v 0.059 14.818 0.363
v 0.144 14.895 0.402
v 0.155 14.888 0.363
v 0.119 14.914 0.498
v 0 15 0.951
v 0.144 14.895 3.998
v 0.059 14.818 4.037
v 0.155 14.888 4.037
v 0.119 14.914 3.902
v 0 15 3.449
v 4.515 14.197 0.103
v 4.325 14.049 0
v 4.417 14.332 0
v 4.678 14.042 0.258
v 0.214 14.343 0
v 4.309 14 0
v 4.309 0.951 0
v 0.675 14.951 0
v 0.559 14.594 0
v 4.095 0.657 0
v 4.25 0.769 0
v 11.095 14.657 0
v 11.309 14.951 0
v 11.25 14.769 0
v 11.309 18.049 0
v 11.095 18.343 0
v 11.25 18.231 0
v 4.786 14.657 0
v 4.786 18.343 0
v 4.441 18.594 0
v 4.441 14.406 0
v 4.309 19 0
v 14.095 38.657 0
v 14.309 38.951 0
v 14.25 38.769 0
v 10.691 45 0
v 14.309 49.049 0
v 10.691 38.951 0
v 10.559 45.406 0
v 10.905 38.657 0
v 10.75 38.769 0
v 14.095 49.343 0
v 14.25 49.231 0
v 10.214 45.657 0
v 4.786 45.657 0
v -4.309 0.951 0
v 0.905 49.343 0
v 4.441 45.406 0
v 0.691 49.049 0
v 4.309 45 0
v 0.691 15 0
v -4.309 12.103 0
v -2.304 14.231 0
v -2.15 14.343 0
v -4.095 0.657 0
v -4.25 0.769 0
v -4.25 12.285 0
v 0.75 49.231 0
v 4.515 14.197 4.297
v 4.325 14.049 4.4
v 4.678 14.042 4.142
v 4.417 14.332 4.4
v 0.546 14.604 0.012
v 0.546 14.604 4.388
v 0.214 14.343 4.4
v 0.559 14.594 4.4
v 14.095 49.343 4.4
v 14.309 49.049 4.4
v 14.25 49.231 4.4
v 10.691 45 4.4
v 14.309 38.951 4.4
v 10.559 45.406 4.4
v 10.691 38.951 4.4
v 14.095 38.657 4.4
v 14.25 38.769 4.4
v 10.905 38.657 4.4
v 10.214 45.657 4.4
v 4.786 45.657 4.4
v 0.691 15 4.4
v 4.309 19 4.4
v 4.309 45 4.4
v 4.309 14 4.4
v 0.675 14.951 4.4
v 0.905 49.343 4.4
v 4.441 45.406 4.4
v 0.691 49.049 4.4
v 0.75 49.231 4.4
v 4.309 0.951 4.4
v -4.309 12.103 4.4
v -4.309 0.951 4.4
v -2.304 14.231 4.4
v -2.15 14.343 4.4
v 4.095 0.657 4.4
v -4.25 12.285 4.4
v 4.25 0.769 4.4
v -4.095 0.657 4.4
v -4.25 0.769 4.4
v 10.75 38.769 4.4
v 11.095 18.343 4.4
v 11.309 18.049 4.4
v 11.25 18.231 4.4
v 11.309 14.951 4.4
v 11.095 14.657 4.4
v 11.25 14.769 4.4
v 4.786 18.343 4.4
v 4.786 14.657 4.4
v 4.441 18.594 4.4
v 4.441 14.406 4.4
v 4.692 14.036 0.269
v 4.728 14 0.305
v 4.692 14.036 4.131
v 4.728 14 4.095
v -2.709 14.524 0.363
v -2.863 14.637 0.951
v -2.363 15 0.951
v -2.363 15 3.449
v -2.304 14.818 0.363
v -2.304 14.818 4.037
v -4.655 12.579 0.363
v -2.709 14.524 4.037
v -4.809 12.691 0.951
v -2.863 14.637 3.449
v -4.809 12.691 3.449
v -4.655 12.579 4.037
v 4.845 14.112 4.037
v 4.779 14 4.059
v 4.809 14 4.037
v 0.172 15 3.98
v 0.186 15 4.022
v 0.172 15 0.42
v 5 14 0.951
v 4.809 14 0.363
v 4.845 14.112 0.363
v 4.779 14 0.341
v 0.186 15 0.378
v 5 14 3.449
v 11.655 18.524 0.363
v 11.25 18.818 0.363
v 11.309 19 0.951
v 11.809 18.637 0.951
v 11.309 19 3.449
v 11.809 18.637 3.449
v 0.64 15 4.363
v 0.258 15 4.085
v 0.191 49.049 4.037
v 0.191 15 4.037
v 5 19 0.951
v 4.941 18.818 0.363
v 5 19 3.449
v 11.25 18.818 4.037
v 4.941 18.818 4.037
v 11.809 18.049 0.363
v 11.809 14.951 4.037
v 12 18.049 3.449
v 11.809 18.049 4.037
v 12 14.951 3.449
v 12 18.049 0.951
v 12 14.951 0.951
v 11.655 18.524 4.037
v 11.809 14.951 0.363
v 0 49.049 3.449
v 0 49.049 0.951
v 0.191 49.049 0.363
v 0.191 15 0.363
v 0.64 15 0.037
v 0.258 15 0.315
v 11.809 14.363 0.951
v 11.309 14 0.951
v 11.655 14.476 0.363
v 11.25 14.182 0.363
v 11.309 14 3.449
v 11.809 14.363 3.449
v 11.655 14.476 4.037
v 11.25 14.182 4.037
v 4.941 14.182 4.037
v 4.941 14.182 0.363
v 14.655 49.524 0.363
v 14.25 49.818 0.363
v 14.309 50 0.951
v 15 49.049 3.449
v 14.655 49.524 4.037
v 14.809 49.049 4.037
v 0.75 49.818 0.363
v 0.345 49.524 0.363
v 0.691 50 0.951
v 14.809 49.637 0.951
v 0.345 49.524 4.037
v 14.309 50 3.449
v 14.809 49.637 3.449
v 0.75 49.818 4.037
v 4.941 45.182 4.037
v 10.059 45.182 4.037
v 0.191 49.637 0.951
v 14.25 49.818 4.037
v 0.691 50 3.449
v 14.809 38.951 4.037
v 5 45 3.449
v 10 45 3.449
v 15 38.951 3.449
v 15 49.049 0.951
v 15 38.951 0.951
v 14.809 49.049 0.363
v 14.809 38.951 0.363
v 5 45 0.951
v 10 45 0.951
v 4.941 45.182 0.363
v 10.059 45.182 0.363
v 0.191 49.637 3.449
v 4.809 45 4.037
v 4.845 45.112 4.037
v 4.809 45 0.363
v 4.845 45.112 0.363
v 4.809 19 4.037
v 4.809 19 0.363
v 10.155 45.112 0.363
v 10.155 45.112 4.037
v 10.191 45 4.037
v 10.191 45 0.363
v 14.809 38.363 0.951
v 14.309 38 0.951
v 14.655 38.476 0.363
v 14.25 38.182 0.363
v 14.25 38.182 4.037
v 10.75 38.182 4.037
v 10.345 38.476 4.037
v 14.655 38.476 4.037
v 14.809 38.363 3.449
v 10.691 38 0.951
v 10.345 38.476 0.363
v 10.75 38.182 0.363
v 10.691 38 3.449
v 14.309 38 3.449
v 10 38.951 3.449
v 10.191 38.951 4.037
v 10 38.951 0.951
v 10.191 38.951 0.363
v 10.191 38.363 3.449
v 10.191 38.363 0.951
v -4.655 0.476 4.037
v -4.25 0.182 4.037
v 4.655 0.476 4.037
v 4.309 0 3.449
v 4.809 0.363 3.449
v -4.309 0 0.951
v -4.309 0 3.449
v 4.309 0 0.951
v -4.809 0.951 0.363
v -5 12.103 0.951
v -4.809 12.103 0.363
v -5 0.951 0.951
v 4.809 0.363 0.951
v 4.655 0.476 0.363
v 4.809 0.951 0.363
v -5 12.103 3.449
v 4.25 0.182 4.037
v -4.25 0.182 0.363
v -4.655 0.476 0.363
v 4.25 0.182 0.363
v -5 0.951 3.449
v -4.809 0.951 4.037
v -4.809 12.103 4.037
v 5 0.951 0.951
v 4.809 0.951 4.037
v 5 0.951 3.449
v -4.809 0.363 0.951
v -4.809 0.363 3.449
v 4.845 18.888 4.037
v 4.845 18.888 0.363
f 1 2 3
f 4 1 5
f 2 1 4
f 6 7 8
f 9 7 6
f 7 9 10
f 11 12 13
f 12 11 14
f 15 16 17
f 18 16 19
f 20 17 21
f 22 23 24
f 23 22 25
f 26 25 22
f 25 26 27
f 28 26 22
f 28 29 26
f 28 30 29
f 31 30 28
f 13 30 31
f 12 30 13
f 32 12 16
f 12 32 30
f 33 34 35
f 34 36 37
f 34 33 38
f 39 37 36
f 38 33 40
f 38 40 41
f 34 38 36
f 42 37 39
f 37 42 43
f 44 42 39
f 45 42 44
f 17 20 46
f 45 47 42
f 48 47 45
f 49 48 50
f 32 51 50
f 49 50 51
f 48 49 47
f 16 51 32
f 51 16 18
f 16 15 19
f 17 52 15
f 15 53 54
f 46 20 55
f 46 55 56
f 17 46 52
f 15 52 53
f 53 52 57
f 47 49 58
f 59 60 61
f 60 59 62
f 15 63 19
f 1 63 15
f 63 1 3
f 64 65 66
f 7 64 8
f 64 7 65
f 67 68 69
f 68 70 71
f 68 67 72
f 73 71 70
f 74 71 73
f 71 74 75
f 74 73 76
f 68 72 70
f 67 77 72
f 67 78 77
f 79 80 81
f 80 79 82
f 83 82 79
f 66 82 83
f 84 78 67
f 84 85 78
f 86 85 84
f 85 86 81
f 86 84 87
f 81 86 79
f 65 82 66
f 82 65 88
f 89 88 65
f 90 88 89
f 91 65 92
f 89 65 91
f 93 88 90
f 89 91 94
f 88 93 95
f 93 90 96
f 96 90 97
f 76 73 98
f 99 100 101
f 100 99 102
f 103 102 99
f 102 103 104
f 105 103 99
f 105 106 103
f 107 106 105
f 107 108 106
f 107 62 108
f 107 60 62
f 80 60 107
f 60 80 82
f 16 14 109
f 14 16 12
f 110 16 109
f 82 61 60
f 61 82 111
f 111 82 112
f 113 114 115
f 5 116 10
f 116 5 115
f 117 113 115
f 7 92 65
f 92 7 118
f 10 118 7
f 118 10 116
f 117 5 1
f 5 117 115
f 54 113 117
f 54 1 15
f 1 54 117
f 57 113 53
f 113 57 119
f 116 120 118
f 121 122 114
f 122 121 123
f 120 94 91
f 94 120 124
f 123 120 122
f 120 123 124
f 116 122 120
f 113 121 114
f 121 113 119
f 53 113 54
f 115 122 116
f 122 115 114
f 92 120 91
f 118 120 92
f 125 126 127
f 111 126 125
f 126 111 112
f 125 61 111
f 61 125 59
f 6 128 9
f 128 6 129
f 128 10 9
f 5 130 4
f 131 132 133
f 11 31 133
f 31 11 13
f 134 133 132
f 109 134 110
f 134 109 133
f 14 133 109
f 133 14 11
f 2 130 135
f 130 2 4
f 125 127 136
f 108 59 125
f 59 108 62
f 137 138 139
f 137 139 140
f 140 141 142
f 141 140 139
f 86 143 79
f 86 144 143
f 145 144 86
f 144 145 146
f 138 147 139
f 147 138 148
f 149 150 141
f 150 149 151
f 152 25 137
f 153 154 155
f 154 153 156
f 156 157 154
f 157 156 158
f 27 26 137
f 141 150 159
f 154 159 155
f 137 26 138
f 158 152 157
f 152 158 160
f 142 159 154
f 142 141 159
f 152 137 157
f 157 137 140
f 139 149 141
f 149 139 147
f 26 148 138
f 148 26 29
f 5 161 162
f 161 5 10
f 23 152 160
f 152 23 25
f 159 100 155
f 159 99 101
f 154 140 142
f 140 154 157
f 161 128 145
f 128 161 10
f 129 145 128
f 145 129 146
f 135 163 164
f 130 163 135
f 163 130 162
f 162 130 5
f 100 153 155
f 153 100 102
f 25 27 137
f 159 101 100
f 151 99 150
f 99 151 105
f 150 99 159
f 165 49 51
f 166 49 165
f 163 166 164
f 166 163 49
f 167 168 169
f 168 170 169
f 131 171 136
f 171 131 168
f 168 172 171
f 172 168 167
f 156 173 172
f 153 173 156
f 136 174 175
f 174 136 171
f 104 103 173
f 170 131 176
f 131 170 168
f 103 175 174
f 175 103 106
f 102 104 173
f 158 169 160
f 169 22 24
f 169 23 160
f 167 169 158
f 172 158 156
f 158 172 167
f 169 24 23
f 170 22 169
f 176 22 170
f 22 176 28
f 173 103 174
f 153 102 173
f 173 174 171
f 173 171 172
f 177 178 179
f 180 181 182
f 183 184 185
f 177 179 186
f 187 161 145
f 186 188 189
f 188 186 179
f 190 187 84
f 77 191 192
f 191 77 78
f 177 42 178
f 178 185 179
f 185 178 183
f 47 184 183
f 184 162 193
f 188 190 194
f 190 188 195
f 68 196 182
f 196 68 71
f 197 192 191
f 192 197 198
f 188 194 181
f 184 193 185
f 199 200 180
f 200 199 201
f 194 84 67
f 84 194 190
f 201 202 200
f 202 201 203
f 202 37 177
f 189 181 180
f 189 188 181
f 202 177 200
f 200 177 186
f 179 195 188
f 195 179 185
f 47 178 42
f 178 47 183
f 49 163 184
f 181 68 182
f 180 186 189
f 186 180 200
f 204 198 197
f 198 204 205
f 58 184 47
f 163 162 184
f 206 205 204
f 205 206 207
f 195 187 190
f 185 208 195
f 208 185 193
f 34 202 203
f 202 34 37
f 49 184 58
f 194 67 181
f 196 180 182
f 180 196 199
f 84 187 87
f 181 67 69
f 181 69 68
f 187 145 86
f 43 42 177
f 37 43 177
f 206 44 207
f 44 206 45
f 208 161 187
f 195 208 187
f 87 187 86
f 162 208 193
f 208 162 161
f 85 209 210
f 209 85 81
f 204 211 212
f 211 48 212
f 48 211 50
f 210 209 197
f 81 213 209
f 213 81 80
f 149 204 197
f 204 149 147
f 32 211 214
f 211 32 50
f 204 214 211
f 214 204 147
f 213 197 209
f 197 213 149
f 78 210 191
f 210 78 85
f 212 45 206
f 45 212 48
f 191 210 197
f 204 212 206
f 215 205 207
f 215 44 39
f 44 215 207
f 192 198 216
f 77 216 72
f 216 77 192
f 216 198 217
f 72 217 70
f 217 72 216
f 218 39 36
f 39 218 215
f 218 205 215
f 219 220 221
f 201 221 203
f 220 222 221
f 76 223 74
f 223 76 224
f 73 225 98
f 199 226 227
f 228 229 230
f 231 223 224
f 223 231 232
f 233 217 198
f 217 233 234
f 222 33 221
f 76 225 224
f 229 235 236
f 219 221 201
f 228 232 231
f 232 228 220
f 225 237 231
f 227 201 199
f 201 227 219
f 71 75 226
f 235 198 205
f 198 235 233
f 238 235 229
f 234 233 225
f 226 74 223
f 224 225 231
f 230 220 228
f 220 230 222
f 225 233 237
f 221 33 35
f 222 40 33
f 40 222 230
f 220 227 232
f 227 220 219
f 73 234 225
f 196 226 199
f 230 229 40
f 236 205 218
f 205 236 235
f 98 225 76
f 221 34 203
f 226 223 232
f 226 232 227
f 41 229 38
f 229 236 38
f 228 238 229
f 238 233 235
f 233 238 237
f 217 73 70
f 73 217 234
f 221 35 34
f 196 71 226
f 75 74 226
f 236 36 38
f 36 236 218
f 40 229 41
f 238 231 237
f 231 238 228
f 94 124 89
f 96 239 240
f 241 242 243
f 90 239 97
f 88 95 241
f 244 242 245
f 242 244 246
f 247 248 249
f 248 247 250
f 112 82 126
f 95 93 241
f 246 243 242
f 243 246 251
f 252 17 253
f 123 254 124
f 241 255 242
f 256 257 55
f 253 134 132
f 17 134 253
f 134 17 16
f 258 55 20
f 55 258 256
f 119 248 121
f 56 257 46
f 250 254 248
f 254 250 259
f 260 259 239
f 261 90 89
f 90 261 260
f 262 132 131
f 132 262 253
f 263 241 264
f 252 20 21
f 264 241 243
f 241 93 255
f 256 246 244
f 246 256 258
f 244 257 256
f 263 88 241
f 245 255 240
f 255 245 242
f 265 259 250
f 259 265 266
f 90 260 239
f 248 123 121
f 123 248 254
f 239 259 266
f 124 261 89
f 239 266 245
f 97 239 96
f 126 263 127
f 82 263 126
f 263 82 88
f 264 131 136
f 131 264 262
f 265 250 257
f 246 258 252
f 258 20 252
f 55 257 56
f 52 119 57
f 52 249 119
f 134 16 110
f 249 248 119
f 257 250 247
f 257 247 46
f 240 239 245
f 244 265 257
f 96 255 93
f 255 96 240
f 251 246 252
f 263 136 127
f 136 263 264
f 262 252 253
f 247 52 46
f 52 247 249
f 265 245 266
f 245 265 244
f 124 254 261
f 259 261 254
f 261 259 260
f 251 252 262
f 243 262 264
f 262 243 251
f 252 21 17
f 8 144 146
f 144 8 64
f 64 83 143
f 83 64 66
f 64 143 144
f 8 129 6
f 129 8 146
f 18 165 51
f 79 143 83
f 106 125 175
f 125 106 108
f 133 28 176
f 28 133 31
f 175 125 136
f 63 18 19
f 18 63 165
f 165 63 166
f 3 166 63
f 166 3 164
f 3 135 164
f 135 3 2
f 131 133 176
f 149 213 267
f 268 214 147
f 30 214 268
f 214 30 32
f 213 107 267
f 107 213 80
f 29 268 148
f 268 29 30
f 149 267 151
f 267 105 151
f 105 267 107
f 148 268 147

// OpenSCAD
/* [Hidden] */
$fn = 10;

CLIP_HEIGHT = 12;
CLIP_PIN_INNER_DISTANCE = 26;
PIN_LENGTH = 7;

BASE_WIDTH = 4.4;
BASE_DEPTH = 5;

/* [Base] */
// Height of the base.
BASE_HEIGHT = 50; // [36:100]

/* [Hook] */
// Enable Smooth Edges.
ENABLE_SMOOTH_EDGES = true;
// Make the hook a bit prettier.
ENABLE_HOOK_NICE = true;
// Length (horizontal size) of the hook.
HOOK_SIZE_H = 10; // [1:100]
// Height (vertical size) of the hook.
HOOK_SIZE_V = 10; // [0:50]
// Vertical rotation of the hook.
HOOK_ROTATION = 0; // [0:90]


minkowskiOutsideRound(1, ENABLE_SMOOTH_EDGES) {
	hook(
		base_height = BASE_HEIGHT,
		base_width = BASE_WIDTH,
		base_depth = BASE_DEPTH,
		clip_height = CLIP_HEIGHT,
		clip_pin_distance = CLIP_PIN_INNER_DISTANCE,
		pin_length = PIN_LENGTH,
		hook_size_h = HOOK_SIZE_H,
		hook_size_v = HOOK_SIZE_V,
		hook_nice = ENABLE_HOOK_NICE,
		hook_rotation = HOOK_ROTATION
	);
}


module hook(
	base_height = 50,
	base_width = 4.4,
	base_depth = 5,
	clip_height = 12,
	clip_pin_distance = 19,
	pin_length = 7,
	hook_size_h = 15,
	hook_size_v = 5,
	hook_nice = true,
	hook_rotation = 0,
) {
	// Base
	cube(size=[base_depth, base_height, base_width]);

	// Clip, Top
	translate([base_depth, base_height-base_depth, 0]) {
		cube(size=[base_depth, base_depth, base_width]);
	}

	// Clip, Back
	translate([base_depth*2, base_height-clip_height, 0]) {
		cube(size=[base_depth, clip_height, base_width]);
	}

	// Pin
	translate([base_depth, base_height-2*base_depth-clip_pin_distance, 0]) {
		cube(size=[7, base_depth, base_width]);
	}

	// Hook, Horizontal
	translate([-(hook_size_h-base_depth), 0, 0]) {
		cube(size=[hook_size_h-base_depth, base_depth, base_width]);
	}

	// Hook, Vertical
	if (hook_size_h > 0) {
		translate([-(hook_size_h-base_depth), 0, 0]) {
			rotate([0, 0, hook_rotation]) {
				difference() {
					cube(size=[base_depth, base_depth+hook_size_v, base_width]);
					
					if (hook_nice == true) {
						translate([0, hook_size_v+base_depth/2, -1]) {
							rotate([0, 0, 45]) {
							cube(size=[base_depth, base_depth, base_width+2]);
							}
						}
					}
				}
			}
		}
	}
}

// Library: MinkowskiRound.scad
// Version: 1.0
// Author: IrevDev
// Copyright: 2017
// License: LGPL 2.1 or later
// Url: https://github.com/Irev-Dev/Round-Anything

module minkowskiOutsideRound(r=1,enable=true,cubeSize=[500,500,500]){
    if(enable==false){//do nothing if not enabled
        children();
    } else {
        minkowski(){//expand the now positive shape
            difference(){//make the negative positive
                cube(cubeSize-[0.1,0.1,0.1],center=true);
                minkowski(){//expand the negative inwards
                    difference(){//create a negative of the children
                        cube(cubeSize,center=true);
                        children();
                    }
                    sphere(r);
                }
            }
            sphere(r);
        }
    }
}
